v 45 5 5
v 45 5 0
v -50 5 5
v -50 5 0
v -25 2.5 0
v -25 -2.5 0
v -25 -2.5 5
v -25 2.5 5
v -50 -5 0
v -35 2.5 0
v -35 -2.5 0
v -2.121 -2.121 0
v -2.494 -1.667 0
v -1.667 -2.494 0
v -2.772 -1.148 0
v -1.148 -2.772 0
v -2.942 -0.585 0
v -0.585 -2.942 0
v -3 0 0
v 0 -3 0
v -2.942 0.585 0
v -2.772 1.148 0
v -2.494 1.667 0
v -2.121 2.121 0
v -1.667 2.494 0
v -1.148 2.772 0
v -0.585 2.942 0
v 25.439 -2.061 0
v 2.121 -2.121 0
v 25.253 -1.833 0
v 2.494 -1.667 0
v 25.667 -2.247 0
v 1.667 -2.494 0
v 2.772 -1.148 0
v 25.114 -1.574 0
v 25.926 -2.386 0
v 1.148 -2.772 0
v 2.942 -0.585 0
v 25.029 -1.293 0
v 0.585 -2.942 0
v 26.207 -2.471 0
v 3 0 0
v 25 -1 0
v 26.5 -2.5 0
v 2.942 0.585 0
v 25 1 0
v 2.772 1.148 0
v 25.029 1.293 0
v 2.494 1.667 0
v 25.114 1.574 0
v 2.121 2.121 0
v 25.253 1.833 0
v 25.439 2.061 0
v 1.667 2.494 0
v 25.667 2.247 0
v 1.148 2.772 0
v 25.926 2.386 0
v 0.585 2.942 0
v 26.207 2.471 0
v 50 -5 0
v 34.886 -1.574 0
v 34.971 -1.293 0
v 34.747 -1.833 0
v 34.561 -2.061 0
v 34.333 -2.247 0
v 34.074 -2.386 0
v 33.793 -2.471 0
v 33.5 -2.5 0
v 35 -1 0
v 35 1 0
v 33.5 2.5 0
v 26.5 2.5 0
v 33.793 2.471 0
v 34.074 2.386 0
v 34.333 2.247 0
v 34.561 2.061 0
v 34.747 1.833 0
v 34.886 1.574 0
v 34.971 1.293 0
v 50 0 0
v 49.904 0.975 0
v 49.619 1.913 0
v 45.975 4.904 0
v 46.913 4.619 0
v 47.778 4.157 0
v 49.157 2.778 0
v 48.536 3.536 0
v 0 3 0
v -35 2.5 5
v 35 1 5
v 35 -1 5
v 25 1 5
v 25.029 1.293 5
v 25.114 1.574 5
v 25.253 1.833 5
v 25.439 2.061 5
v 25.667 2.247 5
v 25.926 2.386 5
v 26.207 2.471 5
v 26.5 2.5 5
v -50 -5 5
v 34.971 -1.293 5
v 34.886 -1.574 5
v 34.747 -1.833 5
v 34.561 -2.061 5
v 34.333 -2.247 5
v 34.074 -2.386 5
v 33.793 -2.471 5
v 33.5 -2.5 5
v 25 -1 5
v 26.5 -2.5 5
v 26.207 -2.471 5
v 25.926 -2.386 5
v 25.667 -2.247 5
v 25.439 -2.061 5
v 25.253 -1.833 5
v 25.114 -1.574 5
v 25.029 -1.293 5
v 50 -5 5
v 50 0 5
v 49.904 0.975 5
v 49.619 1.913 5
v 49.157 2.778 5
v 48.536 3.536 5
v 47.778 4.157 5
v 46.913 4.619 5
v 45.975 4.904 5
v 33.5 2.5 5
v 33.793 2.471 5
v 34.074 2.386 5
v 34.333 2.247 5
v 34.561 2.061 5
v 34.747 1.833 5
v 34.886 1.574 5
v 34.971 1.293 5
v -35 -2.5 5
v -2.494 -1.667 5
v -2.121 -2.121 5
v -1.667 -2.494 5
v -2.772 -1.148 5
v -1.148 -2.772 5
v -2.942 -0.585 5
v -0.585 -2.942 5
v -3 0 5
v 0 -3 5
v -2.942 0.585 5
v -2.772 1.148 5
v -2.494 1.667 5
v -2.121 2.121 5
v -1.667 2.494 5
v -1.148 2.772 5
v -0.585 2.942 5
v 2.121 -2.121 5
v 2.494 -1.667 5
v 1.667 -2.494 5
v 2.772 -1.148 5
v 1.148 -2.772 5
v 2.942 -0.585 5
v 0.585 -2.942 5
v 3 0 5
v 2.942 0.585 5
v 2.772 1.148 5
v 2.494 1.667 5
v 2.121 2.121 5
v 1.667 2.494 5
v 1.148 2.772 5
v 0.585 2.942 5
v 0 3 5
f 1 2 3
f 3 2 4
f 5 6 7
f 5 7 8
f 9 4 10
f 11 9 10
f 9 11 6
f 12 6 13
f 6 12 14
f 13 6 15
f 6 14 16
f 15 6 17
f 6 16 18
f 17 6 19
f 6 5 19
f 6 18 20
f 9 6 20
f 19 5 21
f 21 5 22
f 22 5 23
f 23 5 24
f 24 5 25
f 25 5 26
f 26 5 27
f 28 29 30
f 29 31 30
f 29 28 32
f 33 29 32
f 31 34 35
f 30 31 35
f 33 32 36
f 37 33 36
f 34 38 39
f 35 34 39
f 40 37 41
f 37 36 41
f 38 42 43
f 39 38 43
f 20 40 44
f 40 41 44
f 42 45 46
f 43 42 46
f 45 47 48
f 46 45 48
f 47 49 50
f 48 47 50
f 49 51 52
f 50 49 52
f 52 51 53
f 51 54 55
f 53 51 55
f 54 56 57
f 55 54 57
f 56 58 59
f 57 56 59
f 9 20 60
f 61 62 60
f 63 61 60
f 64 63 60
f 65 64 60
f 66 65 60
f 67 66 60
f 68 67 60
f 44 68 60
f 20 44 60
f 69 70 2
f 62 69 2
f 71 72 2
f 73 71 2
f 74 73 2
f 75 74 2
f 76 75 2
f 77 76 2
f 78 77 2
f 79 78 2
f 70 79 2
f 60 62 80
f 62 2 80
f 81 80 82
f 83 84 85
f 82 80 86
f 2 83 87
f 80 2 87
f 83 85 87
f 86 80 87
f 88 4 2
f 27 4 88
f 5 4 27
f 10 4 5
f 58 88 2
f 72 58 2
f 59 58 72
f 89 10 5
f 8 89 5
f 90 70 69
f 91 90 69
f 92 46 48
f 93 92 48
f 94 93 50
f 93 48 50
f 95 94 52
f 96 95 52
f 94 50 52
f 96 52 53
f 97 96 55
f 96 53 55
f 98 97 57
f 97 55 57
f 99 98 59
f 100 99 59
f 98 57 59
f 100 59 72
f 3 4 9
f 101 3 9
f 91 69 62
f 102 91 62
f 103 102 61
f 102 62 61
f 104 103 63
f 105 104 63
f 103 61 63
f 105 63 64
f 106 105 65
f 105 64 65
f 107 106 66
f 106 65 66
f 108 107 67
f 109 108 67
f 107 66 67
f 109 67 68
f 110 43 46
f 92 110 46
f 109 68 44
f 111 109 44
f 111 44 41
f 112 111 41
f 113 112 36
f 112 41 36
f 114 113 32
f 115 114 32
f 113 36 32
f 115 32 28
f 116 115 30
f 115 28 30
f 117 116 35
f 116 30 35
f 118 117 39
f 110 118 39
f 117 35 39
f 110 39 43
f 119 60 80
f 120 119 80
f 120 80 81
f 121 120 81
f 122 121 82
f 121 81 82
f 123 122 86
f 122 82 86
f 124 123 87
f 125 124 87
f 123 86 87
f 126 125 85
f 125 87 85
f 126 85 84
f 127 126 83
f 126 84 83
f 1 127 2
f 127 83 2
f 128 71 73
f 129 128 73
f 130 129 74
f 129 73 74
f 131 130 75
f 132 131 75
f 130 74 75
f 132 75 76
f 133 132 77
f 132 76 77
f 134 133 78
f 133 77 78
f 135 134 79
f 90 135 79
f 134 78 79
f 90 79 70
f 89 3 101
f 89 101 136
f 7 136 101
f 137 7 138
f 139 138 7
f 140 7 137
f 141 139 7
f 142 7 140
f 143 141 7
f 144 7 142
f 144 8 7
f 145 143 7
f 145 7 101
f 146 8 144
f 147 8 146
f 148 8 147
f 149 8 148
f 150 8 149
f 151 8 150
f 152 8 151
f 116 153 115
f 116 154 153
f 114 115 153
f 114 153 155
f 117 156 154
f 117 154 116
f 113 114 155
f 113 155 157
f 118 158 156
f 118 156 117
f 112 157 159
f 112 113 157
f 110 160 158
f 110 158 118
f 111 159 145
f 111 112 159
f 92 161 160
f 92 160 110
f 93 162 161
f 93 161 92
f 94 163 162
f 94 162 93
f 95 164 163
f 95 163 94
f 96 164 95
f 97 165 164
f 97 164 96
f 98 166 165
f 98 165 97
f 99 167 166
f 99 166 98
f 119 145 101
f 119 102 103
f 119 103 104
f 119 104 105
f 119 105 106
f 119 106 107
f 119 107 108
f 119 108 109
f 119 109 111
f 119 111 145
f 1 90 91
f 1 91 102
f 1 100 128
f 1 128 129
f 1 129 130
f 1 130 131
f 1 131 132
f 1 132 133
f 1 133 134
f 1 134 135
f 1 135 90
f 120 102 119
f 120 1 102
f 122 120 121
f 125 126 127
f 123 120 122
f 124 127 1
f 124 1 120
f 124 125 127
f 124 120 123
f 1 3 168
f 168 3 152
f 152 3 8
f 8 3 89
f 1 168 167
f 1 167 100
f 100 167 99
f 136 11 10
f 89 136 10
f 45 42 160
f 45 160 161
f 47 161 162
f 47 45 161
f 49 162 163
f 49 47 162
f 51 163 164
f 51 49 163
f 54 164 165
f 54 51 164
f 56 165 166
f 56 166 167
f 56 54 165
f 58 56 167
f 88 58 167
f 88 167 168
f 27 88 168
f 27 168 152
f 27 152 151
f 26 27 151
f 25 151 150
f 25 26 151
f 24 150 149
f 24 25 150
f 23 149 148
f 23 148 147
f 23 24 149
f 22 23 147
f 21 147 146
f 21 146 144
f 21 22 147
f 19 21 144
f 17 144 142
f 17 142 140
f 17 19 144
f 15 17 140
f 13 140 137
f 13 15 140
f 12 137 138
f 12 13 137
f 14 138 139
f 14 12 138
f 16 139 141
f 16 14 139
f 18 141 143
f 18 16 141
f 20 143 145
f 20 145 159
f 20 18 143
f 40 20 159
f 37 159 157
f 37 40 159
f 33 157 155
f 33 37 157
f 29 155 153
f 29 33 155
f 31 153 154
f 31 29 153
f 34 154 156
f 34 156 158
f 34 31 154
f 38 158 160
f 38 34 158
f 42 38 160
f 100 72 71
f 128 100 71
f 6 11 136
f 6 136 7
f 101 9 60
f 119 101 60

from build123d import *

# Parameters (mm, degrees)
F0_W     = 10
F0_H     = 5
F0_R     = 3
F1_DEPTH = 5


with BuildPart() as f1:
    # F0 (on Top) → F1 (new body)
    with BuildSketch(Plane.XY):
        with BuildLine():
            Line((-50, -5), (50, -5))
            Line((50, -5), (50, 0))
            ThreePointArc((50, 0), (48.535534, 3.535534), (45, 5))
            Line((45, 5), (-50, 5))
            Line((-50, 5), (-50, -5))
        make_face()
        with Locations((-30, 0)):
            Rectangle(F0_W, F0_H, mode=Mode.SUBTRACT)
        Circle(F0_R, mode=Mode.SUBTRACT)
        with BuildLine():
            ThreePointArc((35, -1), (34.56066, -2.06066), (33.5, -2.5))
            Line((33.5, -2.5), (26.5, -2.5))
            ThreePointArc((26.5, -2.5), (25.43934, -2.06066), (25, -1))
            Line((25, -1), (25, 1))
            ThreePointArc((25, 1), (25.43934, 2.06066), (26.5, 2.5))
            Line((26.5, 2.5), (33.5, 2.5))
            ThreePointArc((33.5, 2.5), (34.56066, 2.06066), (35, 1))
            Line((35, 1), (35, -1))
        make_face(mode=Mode.SUBTRACT)
    extrude(amount=F1_DEPTH)


solid = f1.part
